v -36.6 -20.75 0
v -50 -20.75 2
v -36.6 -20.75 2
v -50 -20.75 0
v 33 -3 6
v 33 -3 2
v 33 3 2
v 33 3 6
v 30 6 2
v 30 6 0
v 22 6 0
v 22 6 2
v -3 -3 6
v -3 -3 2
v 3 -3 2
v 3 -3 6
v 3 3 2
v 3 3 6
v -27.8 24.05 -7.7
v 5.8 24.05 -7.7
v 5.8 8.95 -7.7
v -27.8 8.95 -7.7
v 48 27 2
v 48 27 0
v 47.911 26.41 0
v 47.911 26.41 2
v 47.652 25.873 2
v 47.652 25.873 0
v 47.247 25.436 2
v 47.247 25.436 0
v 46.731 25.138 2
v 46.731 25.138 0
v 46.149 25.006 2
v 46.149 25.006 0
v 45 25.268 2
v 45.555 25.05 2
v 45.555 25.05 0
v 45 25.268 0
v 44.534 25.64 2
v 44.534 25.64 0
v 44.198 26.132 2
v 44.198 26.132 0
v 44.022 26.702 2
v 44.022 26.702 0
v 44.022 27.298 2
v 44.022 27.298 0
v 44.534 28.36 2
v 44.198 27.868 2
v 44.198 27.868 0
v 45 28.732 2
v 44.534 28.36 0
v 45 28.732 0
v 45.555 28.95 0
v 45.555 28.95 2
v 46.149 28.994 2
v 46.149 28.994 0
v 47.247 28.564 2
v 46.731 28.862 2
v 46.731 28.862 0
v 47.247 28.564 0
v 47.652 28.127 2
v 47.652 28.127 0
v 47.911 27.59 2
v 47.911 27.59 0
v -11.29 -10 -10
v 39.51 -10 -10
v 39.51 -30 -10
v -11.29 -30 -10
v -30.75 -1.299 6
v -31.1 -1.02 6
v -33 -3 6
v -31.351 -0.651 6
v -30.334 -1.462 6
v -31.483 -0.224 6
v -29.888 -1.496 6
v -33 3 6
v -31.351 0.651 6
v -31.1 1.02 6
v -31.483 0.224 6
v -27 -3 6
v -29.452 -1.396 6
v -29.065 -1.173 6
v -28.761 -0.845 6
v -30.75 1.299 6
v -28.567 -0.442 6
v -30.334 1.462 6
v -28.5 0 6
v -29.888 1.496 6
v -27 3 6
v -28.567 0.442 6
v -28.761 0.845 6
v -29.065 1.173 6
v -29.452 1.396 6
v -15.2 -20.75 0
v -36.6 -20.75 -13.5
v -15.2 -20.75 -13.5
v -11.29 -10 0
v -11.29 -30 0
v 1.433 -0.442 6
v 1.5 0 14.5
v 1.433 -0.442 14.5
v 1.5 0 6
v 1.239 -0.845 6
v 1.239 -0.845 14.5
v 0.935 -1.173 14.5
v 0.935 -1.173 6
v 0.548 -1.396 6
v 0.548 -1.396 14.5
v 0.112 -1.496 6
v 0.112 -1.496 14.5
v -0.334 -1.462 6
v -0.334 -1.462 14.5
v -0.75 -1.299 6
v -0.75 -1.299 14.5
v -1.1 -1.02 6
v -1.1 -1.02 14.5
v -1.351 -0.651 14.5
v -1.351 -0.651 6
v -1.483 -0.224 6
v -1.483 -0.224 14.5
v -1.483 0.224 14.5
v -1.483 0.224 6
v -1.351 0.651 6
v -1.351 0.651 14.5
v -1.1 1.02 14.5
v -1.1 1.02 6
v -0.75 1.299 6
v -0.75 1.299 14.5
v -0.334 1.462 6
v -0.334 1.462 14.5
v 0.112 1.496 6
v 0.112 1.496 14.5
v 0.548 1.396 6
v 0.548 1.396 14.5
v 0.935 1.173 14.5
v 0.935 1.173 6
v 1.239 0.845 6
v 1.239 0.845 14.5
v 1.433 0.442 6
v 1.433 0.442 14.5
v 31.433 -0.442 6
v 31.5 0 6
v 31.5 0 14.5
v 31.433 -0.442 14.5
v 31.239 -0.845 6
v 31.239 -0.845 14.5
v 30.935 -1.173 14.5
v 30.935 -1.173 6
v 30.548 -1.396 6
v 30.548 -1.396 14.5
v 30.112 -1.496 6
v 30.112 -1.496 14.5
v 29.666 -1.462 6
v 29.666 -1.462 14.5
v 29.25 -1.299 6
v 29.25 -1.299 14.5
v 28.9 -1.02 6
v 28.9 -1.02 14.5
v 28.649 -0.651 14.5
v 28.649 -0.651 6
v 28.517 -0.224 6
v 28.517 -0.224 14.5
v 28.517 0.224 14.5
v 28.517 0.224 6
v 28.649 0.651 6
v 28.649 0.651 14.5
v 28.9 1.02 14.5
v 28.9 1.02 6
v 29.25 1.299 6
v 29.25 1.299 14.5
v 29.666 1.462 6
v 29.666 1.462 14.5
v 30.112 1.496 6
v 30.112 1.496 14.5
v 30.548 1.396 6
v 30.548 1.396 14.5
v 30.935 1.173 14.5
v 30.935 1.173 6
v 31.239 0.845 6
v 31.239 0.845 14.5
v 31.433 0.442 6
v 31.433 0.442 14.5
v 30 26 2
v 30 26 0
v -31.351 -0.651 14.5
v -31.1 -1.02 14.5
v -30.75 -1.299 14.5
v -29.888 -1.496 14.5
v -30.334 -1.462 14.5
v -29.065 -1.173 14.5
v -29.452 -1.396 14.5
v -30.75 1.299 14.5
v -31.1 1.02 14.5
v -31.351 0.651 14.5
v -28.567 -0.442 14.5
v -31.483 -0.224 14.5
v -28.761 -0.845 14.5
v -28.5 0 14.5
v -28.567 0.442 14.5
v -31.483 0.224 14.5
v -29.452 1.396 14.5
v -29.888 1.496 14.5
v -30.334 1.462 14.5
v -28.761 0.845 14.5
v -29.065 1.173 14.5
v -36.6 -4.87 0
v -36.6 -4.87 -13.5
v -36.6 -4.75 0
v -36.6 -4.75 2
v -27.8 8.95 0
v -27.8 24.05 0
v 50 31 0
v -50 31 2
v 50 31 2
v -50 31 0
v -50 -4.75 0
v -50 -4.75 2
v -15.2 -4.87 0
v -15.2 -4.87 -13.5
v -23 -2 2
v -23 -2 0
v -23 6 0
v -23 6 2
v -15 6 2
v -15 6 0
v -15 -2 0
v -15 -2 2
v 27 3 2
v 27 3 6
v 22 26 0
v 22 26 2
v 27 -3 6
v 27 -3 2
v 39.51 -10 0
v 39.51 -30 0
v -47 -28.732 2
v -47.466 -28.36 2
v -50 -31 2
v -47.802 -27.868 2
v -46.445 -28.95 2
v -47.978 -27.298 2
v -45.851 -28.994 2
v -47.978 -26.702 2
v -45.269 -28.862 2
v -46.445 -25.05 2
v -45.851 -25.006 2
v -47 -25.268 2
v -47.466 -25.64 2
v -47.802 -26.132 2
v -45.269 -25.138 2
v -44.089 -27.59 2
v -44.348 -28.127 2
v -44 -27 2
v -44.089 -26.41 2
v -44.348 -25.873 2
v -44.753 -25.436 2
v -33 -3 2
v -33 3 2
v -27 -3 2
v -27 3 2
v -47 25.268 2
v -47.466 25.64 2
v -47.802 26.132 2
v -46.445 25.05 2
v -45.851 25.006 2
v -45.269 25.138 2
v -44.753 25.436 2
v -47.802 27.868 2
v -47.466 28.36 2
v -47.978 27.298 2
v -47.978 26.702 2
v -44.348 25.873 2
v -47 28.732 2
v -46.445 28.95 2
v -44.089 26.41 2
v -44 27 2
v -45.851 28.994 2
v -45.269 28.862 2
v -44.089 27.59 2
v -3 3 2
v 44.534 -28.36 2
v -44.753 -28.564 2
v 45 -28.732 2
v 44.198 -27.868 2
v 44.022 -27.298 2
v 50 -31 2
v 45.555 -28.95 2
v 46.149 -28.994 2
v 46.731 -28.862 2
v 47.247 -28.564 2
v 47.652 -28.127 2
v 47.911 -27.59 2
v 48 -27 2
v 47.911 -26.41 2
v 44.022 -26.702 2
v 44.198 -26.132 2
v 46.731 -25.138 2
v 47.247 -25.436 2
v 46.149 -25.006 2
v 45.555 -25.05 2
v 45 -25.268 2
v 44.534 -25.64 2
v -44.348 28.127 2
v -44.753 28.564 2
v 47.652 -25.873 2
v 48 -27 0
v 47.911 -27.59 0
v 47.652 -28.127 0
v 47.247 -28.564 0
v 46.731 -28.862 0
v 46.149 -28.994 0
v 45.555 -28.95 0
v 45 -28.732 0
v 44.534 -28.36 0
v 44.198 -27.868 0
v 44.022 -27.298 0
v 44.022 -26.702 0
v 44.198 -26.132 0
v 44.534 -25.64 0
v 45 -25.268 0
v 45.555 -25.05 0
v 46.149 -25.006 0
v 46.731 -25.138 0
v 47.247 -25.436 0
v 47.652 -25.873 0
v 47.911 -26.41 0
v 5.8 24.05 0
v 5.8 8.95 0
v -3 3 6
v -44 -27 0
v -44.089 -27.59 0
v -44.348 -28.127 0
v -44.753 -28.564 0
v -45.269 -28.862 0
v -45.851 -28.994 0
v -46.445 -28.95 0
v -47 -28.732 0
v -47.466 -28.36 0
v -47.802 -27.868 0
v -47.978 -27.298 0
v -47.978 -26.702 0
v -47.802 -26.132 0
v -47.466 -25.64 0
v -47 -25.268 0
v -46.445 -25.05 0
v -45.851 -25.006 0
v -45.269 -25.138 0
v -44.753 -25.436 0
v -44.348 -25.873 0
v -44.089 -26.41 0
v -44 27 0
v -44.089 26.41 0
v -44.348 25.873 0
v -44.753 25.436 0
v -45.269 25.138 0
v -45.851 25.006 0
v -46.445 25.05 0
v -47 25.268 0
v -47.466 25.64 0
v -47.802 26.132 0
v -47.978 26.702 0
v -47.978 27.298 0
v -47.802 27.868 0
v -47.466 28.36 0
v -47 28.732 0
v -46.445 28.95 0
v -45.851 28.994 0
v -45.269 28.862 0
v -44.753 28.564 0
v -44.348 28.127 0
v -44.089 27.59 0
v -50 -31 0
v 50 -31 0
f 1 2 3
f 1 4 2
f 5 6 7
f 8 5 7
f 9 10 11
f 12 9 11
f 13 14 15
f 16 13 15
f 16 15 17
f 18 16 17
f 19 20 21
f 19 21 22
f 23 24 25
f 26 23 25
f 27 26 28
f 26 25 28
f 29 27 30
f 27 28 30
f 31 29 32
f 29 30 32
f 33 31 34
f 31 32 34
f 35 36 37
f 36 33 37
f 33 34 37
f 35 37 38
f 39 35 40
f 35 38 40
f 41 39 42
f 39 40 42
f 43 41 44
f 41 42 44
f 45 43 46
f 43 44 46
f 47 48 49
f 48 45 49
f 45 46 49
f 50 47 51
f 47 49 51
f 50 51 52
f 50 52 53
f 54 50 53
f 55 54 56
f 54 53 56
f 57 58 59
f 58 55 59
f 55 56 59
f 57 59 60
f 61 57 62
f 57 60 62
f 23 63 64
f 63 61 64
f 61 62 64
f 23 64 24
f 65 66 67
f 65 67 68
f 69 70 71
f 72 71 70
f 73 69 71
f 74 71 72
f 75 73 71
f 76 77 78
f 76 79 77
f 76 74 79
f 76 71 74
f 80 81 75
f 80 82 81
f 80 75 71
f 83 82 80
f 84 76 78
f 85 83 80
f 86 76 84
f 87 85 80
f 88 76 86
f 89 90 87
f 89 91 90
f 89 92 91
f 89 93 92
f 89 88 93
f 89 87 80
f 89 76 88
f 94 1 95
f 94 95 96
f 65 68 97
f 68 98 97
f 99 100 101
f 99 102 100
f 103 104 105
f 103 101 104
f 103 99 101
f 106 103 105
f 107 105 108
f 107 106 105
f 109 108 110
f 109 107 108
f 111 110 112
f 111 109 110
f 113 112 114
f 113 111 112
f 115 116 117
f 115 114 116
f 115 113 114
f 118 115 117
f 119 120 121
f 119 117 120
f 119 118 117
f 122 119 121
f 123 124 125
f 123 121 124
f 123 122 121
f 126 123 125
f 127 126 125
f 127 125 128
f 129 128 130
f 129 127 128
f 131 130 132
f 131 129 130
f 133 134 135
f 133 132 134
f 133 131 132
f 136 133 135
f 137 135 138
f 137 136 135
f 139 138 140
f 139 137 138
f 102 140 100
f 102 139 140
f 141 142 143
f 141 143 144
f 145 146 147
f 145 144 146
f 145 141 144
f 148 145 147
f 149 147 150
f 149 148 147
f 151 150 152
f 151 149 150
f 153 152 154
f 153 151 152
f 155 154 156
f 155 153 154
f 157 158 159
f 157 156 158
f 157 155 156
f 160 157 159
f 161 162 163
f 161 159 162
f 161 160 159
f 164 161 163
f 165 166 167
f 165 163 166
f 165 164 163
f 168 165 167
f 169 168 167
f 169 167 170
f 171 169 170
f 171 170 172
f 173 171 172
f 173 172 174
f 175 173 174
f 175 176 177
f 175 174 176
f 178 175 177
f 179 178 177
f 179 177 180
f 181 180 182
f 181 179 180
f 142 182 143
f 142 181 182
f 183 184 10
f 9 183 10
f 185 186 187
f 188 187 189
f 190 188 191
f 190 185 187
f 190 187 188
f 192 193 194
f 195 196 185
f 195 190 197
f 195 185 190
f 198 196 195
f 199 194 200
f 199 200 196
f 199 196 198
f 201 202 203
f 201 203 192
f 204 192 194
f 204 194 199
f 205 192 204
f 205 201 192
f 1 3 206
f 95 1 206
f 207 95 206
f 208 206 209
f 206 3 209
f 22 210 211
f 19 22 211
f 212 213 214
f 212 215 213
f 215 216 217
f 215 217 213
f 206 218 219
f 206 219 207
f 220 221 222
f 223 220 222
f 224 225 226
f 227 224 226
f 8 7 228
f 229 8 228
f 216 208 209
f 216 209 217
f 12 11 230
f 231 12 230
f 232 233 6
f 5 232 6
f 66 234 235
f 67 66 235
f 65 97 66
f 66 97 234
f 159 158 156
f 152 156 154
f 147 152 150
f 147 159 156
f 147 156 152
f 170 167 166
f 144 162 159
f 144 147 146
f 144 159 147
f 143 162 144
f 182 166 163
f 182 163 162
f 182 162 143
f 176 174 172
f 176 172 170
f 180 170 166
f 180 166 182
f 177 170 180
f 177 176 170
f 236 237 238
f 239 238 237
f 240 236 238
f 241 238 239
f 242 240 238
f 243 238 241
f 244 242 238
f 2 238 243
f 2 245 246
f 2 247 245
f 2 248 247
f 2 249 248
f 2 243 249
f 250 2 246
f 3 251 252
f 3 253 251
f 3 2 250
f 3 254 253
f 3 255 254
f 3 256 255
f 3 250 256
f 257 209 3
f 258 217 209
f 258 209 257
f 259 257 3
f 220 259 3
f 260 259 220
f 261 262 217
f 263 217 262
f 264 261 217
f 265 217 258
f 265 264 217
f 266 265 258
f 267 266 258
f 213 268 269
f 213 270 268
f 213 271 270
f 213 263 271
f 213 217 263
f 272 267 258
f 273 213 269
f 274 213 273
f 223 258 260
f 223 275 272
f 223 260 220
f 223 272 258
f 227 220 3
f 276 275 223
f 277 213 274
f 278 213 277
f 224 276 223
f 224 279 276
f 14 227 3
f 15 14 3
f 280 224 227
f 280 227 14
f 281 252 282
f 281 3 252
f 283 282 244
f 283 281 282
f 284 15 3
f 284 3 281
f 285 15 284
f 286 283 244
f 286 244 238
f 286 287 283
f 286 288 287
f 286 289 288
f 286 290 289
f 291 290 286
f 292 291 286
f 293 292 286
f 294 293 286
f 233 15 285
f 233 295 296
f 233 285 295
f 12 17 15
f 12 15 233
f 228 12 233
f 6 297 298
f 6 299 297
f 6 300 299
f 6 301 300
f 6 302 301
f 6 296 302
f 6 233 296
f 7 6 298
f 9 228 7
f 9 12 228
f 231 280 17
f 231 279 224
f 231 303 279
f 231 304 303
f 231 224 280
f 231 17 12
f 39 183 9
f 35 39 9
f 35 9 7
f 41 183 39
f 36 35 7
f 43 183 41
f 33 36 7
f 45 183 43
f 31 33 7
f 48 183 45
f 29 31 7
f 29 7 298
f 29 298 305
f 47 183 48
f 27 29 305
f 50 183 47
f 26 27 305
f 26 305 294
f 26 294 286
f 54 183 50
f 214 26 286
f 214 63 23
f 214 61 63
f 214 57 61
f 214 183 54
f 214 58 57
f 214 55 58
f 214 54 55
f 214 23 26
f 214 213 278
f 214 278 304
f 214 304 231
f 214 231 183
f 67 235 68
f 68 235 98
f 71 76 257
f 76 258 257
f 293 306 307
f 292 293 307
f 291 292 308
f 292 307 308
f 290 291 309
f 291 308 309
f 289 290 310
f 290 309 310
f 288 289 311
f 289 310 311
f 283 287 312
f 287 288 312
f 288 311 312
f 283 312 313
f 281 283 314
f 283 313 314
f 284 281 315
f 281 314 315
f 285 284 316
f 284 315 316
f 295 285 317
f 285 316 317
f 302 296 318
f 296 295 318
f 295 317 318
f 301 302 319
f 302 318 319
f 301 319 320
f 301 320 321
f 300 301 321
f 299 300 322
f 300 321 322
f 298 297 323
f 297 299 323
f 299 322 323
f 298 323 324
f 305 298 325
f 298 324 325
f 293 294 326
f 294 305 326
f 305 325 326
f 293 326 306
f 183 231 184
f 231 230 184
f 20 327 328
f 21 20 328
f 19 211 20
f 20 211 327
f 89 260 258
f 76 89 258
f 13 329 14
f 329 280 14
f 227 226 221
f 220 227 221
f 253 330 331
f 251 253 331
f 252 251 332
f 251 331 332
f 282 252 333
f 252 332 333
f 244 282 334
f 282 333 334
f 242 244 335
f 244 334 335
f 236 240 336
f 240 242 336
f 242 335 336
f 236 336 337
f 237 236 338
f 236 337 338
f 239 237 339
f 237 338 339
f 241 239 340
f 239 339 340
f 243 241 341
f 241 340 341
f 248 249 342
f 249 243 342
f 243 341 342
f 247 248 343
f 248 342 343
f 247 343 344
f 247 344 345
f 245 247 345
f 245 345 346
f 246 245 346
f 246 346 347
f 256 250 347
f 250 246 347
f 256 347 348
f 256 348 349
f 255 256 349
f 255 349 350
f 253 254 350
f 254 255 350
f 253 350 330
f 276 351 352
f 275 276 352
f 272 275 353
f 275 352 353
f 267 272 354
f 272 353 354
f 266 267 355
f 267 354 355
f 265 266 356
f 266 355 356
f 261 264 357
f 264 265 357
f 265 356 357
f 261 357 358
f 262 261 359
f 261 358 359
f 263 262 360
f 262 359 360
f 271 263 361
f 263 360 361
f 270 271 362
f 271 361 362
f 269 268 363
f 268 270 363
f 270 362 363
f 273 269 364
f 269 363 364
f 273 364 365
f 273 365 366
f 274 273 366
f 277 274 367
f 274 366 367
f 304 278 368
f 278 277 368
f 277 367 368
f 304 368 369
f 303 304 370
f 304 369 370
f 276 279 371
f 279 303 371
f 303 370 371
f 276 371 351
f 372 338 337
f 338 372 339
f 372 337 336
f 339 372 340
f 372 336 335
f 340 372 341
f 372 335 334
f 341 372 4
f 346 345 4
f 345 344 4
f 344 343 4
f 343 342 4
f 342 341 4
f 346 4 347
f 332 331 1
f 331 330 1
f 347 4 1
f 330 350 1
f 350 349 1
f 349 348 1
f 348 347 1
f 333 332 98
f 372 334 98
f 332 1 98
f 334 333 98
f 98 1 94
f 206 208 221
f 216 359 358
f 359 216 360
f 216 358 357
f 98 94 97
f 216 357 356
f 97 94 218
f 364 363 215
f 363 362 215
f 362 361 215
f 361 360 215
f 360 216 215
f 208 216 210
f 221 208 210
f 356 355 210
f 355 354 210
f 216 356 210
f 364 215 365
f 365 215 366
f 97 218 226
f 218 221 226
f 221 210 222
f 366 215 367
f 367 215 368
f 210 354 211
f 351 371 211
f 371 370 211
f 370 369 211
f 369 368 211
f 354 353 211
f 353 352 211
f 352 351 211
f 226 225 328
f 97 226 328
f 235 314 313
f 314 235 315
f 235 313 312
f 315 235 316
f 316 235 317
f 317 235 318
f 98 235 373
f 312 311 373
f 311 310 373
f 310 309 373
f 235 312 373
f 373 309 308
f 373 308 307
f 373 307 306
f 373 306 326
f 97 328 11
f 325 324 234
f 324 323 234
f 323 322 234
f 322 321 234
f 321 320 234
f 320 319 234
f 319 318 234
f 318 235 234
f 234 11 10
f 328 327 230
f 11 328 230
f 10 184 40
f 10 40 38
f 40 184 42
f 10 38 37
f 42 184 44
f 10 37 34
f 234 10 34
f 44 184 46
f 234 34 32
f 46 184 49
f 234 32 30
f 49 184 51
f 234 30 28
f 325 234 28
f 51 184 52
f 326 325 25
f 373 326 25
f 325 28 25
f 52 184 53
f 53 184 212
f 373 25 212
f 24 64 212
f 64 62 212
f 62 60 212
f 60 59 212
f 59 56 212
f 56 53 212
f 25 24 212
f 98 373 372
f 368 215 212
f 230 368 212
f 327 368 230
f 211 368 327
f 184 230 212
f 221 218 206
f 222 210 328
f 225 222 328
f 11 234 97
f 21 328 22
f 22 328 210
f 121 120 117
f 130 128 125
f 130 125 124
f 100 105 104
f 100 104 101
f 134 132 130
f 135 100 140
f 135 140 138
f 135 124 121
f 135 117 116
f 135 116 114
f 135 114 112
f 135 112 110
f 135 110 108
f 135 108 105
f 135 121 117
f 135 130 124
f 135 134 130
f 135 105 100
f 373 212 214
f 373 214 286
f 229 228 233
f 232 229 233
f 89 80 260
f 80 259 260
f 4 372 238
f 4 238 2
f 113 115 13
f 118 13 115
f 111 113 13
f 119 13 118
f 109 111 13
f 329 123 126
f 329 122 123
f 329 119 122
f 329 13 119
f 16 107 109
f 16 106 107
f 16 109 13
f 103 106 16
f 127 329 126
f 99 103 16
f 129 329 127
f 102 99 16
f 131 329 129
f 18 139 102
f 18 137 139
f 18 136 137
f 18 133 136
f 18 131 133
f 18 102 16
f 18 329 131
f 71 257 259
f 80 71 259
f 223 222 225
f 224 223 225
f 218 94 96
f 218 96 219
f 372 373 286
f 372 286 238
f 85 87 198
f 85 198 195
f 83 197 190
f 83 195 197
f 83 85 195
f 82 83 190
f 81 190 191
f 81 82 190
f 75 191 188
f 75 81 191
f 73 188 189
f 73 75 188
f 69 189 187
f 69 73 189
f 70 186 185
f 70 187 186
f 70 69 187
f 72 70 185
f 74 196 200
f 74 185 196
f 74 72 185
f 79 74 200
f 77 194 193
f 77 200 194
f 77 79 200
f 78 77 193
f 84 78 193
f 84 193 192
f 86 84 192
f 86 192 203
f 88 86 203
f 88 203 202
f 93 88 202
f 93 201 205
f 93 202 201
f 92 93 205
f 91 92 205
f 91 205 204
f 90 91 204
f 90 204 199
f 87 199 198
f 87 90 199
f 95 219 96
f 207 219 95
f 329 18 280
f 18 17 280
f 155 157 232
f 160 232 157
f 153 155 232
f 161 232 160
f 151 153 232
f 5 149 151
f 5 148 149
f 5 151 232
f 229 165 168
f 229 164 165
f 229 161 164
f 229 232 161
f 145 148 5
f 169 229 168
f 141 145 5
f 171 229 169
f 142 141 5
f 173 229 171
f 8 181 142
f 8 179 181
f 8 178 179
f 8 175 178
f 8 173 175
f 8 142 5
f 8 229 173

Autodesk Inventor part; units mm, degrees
ref_plane "YZ Plane" through (0, 0, 0) normal (1, 0, 0) x (0, 1, 0)
ref_plane "XZ Plane" through (0, 0, 0) normal (0, 1, 0) x (-1, 0, 0)
ref_plane "XY Plane" through (0, 0, 0) normal (0, 0, 1) x (1, 0, 0)
sketch "Pushbutton" plane through (0, 0, 0) normal (0, 0, 1) x (1, 0, 0)
  line L0 (-3, -3) -> (3, -3)
  line L1 (3, -3) -> (3, 3)
  line L2 (3, 3) -> (-3, 3)
  line L3 (-3, 3) -> (-3, -3)
  line L4 (-3, -3) -> (3, 3) construction
  line L5 (3, -3) -> (-3, 3) construction
  circle A0 centre (0, 0) radius 1.5
  dimension "d26" = 6
  dimension "d28" = 6
  dimension "d29" = 3
sketch "Grundriss Platine" plane through (0, 0, 0) normal (0, 0, 1) x (1, 0, 0)
  line L0 (50, -31) -> (-50, -31)
  line L1 (-50, -31) -> (-50, 31)
  line L2 (-50, 31) -> (50, 31)
  line L3 (50, 31) -> (50, -31)
  line L4 (50, -31) -> (-50, 31) construction
  line L5 (-50, -31) -> (50, 31) construction
  line L6 (46, -28.52) -> (-46, -28.52) construction
  line L7 (46, -28.52) -> (-46, 28.52) construction
  line L8 (-46, -28.52) -> (46, 28.52) construction
  circle A0 centre (-46, -27) radius 2
  circle A1 centre (46, -27) radius 2
  circle A2 centre (-46, 27) radius 2
  circle A3 centre (46, 27) radius 2
  line L9 (-50, -20.75) -> (-36.6, -20.75)
  line L10 (-36.6, -20.75) -> (-36.6, -4.75)
  line L11 (-36.6, -4.75) -> (-50, -4.75)
  line L12 (-50, -4.75) -> (-50, -20.75)
  line L13 (-23, 6) -> (-15, 6)
  line L14 (-15, 6) -> (-15, -2)
  line L15 (-15, -2) -> (-23, -2)
  line L16 (-23, -2) -> (-23, 6)
  line L17 (30, 6) -> (22, 6)
  line L18 (22, 6) -> (22, 26)
  line L19 (22, 26) -> (30, 26)
  line L20 (30, 26) -> (30, 6)
  point P0 (0, 0)
  dimension "Platine_Breite" = 100
  dimension "Platine_Hoehe" = 62
  dimension "d4" = 4
  dimension "d5" = 4
  dimension "d6" = 4
  dimension "d7" = 4
  dimension "d8" = 4
  dimension "d9" = 4
  dimension "d10" = 4
  dimension "d11" = 4
  dimension "d12" = 4
  dimension "d13" = 10.25
  dimension "d14" = 13.4
  dimension "d15" = 26.25
  dimension "d16" = 29
  dimension "d17" = 27
  dimension "d18" = 8
  dimension "d19" = 8
  dimension "d20" = 37
  dimension "d21" = 8
  dimension "d22" = 72
  dimension "d23" = 20
extrude "Extrusion1" add sketch "Grundriss Platine" along normal blind 2 contours L0 L1 L9 L10 L11 L2 L3
sketch "Bauteile Oberseite" plane through (0, 0, 2) normal (0, 0, 1) x (1, 0, 0)
  line L0 (-50, -31) -> (50, -31) projected
  line L1 (50, -31) -> (50, 31) projected
  line L2 (50, 31) -> (-50, 31) projected
  line L3 (-50, 31) -> (-50, -4.75) projected
  line L4 (-23, 6) -> (-15, 6) projected
  line L5 (-50, 0) -> (50, 0) construction
  line L6 (0, 31) -> (0, -31) construction
  line L7 (-3, -3) -> (3, -3)
  line L8 (3, -3) -> (3, 3)
  line L9 (3, 3) -> (-3, 3)
  line L10 (-3, 3) -> (-3, -3)
  line L11 (-3, -3) -> (3, 3) construction
  line L12 (3, -3) -> (-3, 3) construction
  circle A0 centre (0, 0) radius 1.5
  line L13 (-33, -3) -> (-27, -3)
  line L14 (-27, -3) -> (-27, 3)
  line L15 (-27, 3) -> (-33, 3)
  line L16 (-33, 3) -> (-33, -3)
  line L17 (-33, -3) -> (-27, 3) construction
  line L18 (-27, -3) -> (-33, 3) construction
  circle A1 centre (-30, 0) radius 1.5
  line L19 (27, -3) -> (33, -3)
  line L20 (33, -3) -> (33, 3)
  line L21 (33, 3) -> (27, 3)
  line L22 (27, 3) -> (27, -3)
  line L23 (27, -3) -> (33, 3) construction
  line L24 (33, -3) -> (27, 3) construction
  circle A2 centre (30, 0) radius 1.5
  point P0 (-30, 0)
  point P1 (0, 0)
  point P2 (30, 0)
  dimension "d30" = 30
  dimension "d31" = 30
extrude "Extrusion2" add sketch "Bauteile Oberseite" along normal blind 4
extrude "Extrusion3" add sketch "Bauteile Oberseite" along normal blind 12.5 contours A0 | A1 | A2
sketch "Bauteile Unterseite" plane through (0, 0, 0) normal (0, 0, -1) x (-1, 0, 0)
  line L0 (50, -20.75) -> (36.6, -20.75) projected
  line L1 (36.6, -20.75) -> (36.6, -4.75) projected
  line L2 (50, 31) -> (50, -4.75) projected
  line L3 (50, -31) -> (-50, -31) projected
  line L4 (50, -20.75) -> (50, -31) projected
  line L5 (36.6, -20.75) -> (15.2, -20.75)
  line L6 (15.2, -20.75) -> (15.2, -4.87)
  line L7 (15.2, -4.87) -> (36.6, -4.87)
  line L8 (36.6, -4.87) -> (36.6, -20.75)
  line L9 (-39.51, -30) -> (11.29, -30)
  line L10 (11.29, -30) -> (11.29, -10)
  line L11 (11.29, -10) -> (-39.51, -10)
  line L12 (-39.51, -10) -> (-39.51, -30)
  line L13 (-39.51, -30) -> (11.29, -10) construction
  line L14 (11.29, -30) -> (-39.51, -10) construction
  line L15 (27.8, 24.05) -> (-5.8, 24.05)
  line L16 (-5.8, 24.05) -> (-5.8, 8.95)
  line L17 (-5.8, 8.95) -> (27.8, 8.95)
  line L18 (27.8, 8.95) -> (27.8, 24.05)
  line L19 (27.8, 24.05) -> (-5.8, 8.95) construction
  line L20 (-5.8, 24.05) -> (27.8, 8.95) construction
  point P0 (0, 0)
  point P1 (-14.11, -20)
  point P2 (11, 16.5)
  dimension "d37" = 15.88
  dimension "d39" = 21.4
  dimension "d40" = 64.11
  dimension "d41" = 11
  dimension "d42" = 20
  dimension "d43" = 50.8
  dimension "d44" = 39
  dimension "d45" = 47.5
  dimension "d46" = 15.1
  dimension "d47" = 33.6
extrude "Extrusion4" add sketch "Bauteile Unterseite" along normal blind 7.7 contours L18 L17 L16 L15
extrude "Extrusion5" add sketch "Bauteile Unterseite" along normal blind 13.5 contours L5 L6 L7 L1
extrude "Extrusion6" add sketch "Bauteile Unterseite" along normal blind 10 contours L12 L11 L10 L9
equation "\"d24\" = Platine_Dicke"
equation "\"d31\" = d30"
equation "\"Platine_Dicke\" = 2"
equation "\"epsilon\" = 0.1"
equation "\"Wandstaerke\" = 3"
equation "\"Freimass\" = 3"
properties part number "PCB-Model"
